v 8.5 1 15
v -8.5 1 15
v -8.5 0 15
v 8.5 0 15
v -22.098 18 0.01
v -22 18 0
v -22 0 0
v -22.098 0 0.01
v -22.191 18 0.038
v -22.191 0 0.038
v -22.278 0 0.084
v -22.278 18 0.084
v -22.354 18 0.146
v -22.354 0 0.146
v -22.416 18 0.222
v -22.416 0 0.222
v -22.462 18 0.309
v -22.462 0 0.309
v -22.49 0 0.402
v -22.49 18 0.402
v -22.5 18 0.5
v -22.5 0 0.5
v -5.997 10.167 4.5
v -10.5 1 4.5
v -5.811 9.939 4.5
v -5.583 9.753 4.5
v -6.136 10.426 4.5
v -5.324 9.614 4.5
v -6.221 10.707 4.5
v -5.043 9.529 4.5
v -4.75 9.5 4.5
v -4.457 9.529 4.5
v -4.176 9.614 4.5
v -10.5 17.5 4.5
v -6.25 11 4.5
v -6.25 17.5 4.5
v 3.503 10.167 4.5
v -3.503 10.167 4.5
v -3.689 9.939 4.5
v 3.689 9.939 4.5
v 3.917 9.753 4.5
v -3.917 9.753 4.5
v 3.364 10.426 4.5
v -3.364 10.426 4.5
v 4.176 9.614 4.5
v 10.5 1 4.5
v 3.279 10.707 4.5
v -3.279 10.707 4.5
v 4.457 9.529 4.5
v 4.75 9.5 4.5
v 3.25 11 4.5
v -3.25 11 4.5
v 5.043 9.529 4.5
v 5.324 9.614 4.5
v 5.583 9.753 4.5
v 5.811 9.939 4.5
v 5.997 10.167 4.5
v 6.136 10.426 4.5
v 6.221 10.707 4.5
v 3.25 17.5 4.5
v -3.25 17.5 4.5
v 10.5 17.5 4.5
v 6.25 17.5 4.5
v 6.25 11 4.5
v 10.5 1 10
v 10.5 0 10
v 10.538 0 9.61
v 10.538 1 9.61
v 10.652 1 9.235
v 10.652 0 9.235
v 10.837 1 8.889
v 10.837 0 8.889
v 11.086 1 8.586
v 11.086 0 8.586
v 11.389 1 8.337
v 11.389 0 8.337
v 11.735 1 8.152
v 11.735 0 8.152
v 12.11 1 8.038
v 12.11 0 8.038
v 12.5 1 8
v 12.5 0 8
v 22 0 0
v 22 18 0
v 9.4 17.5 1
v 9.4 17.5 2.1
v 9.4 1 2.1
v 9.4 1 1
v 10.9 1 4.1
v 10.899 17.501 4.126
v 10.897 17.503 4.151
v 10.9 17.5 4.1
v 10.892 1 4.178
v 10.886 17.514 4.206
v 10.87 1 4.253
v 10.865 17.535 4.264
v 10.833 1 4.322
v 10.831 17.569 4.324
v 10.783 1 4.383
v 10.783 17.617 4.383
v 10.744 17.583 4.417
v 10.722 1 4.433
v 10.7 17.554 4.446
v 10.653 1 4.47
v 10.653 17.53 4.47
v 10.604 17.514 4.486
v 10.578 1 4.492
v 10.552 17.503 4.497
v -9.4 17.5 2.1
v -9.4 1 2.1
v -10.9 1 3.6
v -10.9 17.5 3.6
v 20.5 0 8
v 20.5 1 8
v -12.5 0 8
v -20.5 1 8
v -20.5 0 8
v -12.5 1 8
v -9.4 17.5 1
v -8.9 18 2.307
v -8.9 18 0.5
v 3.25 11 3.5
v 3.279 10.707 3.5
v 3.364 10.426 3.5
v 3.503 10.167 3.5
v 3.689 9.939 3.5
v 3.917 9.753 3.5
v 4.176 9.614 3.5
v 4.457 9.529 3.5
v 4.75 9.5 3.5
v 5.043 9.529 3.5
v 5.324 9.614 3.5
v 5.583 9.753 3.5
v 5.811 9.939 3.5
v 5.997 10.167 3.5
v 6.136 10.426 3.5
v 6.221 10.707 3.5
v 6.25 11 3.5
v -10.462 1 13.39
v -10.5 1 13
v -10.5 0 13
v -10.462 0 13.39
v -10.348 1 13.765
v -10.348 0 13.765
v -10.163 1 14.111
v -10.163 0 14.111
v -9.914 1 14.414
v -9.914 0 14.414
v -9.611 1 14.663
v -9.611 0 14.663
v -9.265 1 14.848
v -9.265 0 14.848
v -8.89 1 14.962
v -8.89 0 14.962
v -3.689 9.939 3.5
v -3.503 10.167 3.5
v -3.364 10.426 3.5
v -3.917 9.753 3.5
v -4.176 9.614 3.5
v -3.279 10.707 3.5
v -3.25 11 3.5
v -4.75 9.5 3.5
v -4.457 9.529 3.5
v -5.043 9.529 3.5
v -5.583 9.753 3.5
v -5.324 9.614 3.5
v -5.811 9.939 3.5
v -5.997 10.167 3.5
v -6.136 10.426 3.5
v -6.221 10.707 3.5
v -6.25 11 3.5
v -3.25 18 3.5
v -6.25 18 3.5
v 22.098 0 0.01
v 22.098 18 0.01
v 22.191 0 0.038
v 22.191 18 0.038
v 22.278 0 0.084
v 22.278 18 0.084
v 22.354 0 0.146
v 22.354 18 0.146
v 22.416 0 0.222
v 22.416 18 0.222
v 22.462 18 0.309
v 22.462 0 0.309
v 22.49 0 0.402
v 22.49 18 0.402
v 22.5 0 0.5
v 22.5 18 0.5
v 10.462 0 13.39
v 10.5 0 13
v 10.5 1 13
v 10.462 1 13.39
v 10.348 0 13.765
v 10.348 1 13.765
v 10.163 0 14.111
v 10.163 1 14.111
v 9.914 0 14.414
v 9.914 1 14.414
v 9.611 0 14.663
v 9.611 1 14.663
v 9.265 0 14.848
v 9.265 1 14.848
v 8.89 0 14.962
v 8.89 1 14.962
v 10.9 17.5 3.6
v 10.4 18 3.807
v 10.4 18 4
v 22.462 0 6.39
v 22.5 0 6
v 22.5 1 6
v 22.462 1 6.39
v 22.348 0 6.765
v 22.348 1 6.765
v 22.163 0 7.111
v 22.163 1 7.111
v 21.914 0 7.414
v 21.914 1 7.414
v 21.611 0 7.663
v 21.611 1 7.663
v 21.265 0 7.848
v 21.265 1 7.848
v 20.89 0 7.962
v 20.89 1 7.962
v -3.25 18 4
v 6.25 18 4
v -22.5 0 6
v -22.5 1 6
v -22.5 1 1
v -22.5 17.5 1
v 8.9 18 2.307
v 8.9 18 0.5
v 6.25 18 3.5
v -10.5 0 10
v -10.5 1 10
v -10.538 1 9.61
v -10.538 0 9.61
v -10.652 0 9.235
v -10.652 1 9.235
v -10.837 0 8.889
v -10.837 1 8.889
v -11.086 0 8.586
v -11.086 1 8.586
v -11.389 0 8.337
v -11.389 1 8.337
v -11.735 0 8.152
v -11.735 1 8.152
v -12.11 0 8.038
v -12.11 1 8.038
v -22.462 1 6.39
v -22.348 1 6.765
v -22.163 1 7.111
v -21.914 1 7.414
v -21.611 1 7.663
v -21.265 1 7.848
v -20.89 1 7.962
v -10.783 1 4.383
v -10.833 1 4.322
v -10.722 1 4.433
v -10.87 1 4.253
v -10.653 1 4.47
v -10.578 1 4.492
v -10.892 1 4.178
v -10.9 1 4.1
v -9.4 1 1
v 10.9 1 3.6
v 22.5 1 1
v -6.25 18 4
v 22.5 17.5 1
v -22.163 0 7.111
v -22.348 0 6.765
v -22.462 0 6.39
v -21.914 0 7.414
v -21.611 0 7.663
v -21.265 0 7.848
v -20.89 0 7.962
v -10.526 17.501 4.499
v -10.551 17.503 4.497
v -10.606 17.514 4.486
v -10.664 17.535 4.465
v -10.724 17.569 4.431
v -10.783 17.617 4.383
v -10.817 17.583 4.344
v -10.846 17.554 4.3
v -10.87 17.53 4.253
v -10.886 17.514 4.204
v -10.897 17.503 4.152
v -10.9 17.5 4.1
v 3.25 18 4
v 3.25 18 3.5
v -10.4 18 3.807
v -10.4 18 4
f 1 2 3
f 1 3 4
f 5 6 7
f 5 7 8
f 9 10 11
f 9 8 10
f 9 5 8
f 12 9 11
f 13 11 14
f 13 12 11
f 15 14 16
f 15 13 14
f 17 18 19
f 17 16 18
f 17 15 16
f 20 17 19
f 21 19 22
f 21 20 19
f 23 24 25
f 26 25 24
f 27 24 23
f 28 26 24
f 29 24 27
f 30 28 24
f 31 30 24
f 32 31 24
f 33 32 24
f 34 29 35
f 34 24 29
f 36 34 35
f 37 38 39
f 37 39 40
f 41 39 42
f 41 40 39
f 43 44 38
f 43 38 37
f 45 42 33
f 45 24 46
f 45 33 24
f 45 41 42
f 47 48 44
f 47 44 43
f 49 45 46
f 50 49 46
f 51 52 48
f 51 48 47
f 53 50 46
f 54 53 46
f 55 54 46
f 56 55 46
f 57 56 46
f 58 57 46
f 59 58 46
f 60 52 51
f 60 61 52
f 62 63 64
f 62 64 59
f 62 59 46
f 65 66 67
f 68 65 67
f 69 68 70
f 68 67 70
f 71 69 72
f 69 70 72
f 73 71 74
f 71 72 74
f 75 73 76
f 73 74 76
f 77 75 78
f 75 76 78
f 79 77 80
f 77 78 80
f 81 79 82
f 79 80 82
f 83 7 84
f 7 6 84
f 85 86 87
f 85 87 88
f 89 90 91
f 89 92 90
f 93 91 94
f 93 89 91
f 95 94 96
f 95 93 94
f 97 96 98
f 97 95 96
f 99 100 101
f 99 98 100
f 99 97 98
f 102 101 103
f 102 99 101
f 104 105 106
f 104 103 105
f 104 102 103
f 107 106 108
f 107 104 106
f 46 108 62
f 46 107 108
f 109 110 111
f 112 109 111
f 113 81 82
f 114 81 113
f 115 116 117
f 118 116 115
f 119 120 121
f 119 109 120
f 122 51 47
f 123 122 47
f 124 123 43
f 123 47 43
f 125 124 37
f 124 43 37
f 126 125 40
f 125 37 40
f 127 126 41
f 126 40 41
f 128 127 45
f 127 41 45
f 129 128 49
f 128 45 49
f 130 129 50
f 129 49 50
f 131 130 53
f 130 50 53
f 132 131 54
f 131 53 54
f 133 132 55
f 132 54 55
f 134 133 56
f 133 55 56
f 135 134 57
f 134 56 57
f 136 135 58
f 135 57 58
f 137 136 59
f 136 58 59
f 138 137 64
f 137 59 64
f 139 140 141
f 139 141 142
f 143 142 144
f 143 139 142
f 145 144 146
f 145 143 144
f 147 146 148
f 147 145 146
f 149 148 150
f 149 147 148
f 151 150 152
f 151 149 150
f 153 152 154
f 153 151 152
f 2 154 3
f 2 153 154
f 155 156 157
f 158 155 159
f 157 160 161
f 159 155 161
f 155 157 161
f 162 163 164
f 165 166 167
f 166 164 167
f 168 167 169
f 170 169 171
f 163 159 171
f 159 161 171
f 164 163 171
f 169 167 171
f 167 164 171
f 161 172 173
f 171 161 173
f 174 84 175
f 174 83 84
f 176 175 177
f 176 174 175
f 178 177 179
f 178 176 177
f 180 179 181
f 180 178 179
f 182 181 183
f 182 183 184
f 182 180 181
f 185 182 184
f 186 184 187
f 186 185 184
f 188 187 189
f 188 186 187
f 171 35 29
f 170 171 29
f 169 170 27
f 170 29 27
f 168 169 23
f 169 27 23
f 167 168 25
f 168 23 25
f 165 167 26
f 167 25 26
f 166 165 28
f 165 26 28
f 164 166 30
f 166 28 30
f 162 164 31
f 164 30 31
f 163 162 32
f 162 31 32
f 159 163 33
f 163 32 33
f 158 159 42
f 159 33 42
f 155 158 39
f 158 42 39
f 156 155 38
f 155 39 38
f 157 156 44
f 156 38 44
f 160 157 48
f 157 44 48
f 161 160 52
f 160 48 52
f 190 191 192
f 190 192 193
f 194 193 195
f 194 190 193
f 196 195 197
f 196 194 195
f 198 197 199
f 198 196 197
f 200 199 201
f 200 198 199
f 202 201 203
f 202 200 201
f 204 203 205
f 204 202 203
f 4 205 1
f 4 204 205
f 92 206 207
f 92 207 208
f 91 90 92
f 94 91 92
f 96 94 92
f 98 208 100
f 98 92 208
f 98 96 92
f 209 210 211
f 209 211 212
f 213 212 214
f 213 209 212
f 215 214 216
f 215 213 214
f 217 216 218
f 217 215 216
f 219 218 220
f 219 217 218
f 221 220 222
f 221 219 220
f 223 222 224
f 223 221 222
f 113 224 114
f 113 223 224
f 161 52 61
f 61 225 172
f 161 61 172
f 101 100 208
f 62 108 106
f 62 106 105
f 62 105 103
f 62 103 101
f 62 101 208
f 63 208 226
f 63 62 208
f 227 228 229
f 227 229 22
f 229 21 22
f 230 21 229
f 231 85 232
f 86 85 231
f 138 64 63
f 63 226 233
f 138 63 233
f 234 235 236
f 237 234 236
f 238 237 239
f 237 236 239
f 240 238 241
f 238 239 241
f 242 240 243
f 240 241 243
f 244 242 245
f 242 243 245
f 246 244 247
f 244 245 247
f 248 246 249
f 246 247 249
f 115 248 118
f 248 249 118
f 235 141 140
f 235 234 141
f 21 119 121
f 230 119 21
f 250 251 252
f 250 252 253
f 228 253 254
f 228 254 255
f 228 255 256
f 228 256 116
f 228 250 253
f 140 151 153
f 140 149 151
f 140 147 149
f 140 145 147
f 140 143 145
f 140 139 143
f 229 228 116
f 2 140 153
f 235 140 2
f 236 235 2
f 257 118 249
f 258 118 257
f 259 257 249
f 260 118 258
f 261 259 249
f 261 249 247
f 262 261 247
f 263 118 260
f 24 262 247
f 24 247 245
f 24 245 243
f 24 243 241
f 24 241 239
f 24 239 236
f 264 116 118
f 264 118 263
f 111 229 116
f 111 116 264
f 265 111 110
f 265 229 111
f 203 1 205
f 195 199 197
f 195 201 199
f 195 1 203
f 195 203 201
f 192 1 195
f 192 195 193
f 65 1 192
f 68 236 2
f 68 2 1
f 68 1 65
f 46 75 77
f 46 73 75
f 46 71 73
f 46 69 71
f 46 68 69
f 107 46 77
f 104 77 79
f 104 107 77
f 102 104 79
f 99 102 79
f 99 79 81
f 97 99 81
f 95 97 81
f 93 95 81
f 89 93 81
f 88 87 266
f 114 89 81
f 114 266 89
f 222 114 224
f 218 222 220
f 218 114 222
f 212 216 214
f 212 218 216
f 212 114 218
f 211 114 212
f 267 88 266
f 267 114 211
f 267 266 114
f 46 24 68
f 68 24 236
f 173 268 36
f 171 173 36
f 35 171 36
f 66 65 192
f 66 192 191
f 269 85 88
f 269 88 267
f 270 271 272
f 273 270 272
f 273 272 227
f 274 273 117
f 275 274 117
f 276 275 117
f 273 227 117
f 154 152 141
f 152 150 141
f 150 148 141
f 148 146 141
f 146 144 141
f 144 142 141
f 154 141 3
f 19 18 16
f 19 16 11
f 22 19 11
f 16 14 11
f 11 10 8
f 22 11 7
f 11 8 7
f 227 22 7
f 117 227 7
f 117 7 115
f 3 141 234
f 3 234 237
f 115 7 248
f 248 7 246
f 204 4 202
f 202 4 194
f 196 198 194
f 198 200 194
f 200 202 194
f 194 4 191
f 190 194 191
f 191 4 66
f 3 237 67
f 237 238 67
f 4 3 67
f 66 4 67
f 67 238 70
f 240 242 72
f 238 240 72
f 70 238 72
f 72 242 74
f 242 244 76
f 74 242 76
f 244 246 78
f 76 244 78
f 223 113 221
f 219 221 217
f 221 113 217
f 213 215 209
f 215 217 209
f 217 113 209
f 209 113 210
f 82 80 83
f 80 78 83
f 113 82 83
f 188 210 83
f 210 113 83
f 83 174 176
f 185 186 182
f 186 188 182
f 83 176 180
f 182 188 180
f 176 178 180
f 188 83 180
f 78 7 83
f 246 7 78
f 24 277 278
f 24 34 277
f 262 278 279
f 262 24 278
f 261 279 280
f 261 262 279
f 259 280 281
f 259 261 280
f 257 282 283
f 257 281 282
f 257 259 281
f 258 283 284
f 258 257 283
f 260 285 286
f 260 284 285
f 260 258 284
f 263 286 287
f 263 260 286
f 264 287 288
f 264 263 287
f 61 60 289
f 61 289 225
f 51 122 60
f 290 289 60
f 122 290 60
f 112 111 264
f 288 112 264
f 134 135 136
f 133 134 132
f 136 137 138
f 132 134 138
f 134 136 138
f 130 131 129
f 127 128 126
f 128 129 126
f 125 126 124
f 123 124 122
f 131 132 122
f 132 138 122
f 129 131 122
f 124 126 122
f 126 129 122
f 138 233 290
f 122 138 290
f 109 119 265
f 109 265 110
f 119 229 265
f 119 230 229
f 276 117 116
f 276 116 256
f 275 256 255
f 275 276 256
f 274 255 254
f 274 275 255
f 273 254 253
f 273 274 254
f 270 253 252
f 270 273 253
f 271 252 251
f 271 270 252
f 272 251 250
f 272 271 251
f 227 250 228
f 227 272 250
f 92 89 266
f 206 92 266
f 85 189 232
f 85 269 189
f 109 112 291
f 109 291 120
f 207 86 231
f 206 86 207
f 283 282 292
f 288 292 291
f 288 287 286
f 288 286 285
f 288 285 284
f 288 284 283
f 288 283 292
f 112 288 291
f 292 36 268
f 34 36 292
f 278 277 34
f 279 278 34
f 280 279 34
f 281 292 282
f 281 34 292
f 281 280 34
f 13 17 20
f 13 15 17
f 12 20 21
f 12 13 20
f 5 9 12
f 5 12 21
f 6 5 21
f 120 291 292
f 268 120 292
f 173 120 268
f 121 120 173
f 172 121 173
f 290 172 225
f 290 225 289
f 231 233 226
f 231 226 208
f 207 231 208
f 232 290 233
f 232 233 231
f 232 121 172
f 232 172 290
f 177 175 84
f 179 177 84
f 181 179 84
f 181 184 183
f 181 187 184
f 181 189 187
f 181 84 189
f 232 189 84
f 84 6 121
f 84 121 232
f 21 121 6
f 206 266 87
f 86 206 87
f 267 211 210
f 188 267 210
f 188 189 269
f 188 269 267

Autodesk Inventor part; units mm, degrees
ref_plane "YZ Plane" through (0, 0, 0) normal (1, 0, 0) x (0, 1, 0)
ref_plane "XZ Plane" through (0, 0, 0) normal (0, 1, 0) x (-1, 0, 0)
ref_plane "XY Plane" through (0, 0, 0) normal (0, 0, 1) x (1, 0, 0)
sketch "Sketch1" plane through (0, 0, 0) normal (0, 0, 1) x (1, 0, 0)
  line L0 (-22.5, 18) -> (22.5, 18)
  line L1 (22.5, 18) -> (22.5, 0)
  line L2 (22.5, 0) -> (-22.5, 0)
  line L3 (-22.5, 0) -> (-22.5, 18)
  point P0 (0, 0)
  point P1 (0, 0)
  dimension "d0" = 18
  dimension "d1" = 45
extrude "Extrusion1" add sketch "Sketch1" along normal blind 1
sketch "Sketch2" plane through (0, 0, 1) normal (0, 0, 1) x (1, 0, 0)
  line L0 (-22.5, 18) -> (-22.5, 0) projected
  line L1 (-22.5, 0) -> (22.5, 0) projected
  line L2 (-10.5, 1) -> (10.5, 1)
  line L3 (10.5, 1) -> (10.5, 0)
  line L4 (10.5, 0) -> (-10.5, 0)
  line L5 (-10.5, 0) -> (-10.5, 1)
  point P0 (0, 0)
  point P1 (0, 0)
  dimension "d28" = 21
  dimension "d29" = 1
extrude "Extrusion2" add sketch "Sketch2" along normal blind 14
sketch "Sketch5" plane through (0, 0, 1) normal (0, 0, 1) x (1, 0, 0)
  line L0 (-22.5, 0) -> (22.5, 0) projected
  line L1 (-22.5, 18) -> (-22.5, 0) projected
  line L2 (22.5, 0) -> (-22.5, 0)
  line L3 (-22.5, 0) -> (-22.5, 1)
  line L4 (-22.5, 1) -> (22.5, 1)
  line L5 (22.5, 1) -> (22.5, 0)
  line L6 (10.5, 1) -> (-10.5, 1) projected
extrude "Extrusion5" add sketch "Sketch5" along normal blind 7
sketch "Sketch3" plane through (-22.5, 18, 0) normal (0, 1, 0) x (1, 0, 0)
  line L0 (45, -1) -> (0, -1) projected
  line L1 (13.1, -1) -> (13.1, -2.1)
  line L2 (13.1, -2.1) -> (11.6, -3.6)
  line L3 (11.6, -3.6) -> (11.6, -4.5)
  line L4 (11.6, -4.5) -> (33.4, -4.5)
  line L5 (33.4, -4.5) -> (33.4, -3.6)
  line L6 (33.4, -3.6) -> (31.9, -2.1)
  line L7 (31.9, -2.1) -> (31.9, -1)
  line L8 (7, -1) -> (43, -1) projected
  line L9 (22.5, 3) -> (22.5, -18) projected
  point P0 (22.5, 0)
  dimension "d11" = 135
  dimension "d12" = 1.1
  dimension "d13" = 0.9
  dimension "d14" = 21.8
  dimension "d15" = 3.5
  dimension "d27" = 18.8
extrude "Extrusion3" add sketch "Sketch3" against normal up to surface (18 mm away)
chamfer "Chamfer1" distance 0.5 angle 45 9 edges at (0, 18, 4.5) (10.9, 18, 4.05) (10.15, 18, 2.85) (9.4, 18, 1.55) (15.95, 18, 1) (-10.9, 18, 4.05) (-10.15, 18, 2.85) (-9.4, 18, 1.55) (-15.95, 18, 1)
fillet "Fillet1" radius 0.4 2 edges at (10.9, 9.25, 4.5) (-10.9, 9.25, 4.5)
fillet "Fillet1" radius 0.5 2 edges at (22.5, 9, 0) (-22.5, 9, 0)
sketch "Sketch6" plane through (-10.4, 18, 4) normal (0, 1, 0) x (1, 0, 0)
  line L0 (4.15, -8.7835) -> (7.15, -8.7835)
  line L1 (7.15, -8.7835) -> (7.15, 0.5)
  line L2 (7.15, 0.5) -> (4.15, 0.5)
  line L3 (4.15, 0.5) -> (4.15, -8.7835)
  line L4 (13.65, -8.7835) -> (16.65, -8.7835)
  line L5 (16.65, -8.7835) -> (16.65, 0.5)
  line L6 (16.65, 0.5) -> (13.65, 0.5)
  line L7 (13.65, 0.5) -> (13.65, -8.7835)
  line L8 (5.65, -8.7835) -> (5.65, 0.5) construction
  line L9 (15.15, 0.5) -> (15.15, -8.7835) construction
  line L10 (-0.1, -0.5) -> (20.9, -0.5) construction
  point P0 (10.4, 4)
  dimension "d30" = 3
  dimension "d31" = 1
  dimension "d32" = 9.5
  dimension "d33" = 4.75
extrude "Extrusion6" cut sketch "Sketch6" against normal blind 7
sketch "Sketch7" plane through (-10.5, 1, 4.5) normal (0, 0, 1) x (1, 0, 0)
  line L0 (7.25, 10) -> (4.25, 10) projected
  arc A0 (4.25, 10) -> (7.25, 10) centre (5.75, 10) ccw
  line L1 (16.75, 10) -> (13.75, 10) projected
  arc A1 (13.75, 10) -> (16.75, 10) centre (15.25, 10) ccw
  line L2 (7.25, 16.5) -> (7.25, 10) projected
  line L3 (13.75, 10) -> (13.75, 16.5) projected
  point P0 (10.5, -1)
extrude "Extrusion7" cut sketch "Sketch7" against normal up to surface (1 mm away)
fillet "Fillet2" radius 2 6 edges at (10.5, 0.5, 8) (22.5, 0.5, 8) (-22.5, 0.5, 8) (-10.5, 0.5, 8) (-10.5, 0.5, 15) (10.5, 0.5, 15)
equation "\"d33\" = 0.5 * d32"
properties part number "EndSwitchMountingPlate_v02"
